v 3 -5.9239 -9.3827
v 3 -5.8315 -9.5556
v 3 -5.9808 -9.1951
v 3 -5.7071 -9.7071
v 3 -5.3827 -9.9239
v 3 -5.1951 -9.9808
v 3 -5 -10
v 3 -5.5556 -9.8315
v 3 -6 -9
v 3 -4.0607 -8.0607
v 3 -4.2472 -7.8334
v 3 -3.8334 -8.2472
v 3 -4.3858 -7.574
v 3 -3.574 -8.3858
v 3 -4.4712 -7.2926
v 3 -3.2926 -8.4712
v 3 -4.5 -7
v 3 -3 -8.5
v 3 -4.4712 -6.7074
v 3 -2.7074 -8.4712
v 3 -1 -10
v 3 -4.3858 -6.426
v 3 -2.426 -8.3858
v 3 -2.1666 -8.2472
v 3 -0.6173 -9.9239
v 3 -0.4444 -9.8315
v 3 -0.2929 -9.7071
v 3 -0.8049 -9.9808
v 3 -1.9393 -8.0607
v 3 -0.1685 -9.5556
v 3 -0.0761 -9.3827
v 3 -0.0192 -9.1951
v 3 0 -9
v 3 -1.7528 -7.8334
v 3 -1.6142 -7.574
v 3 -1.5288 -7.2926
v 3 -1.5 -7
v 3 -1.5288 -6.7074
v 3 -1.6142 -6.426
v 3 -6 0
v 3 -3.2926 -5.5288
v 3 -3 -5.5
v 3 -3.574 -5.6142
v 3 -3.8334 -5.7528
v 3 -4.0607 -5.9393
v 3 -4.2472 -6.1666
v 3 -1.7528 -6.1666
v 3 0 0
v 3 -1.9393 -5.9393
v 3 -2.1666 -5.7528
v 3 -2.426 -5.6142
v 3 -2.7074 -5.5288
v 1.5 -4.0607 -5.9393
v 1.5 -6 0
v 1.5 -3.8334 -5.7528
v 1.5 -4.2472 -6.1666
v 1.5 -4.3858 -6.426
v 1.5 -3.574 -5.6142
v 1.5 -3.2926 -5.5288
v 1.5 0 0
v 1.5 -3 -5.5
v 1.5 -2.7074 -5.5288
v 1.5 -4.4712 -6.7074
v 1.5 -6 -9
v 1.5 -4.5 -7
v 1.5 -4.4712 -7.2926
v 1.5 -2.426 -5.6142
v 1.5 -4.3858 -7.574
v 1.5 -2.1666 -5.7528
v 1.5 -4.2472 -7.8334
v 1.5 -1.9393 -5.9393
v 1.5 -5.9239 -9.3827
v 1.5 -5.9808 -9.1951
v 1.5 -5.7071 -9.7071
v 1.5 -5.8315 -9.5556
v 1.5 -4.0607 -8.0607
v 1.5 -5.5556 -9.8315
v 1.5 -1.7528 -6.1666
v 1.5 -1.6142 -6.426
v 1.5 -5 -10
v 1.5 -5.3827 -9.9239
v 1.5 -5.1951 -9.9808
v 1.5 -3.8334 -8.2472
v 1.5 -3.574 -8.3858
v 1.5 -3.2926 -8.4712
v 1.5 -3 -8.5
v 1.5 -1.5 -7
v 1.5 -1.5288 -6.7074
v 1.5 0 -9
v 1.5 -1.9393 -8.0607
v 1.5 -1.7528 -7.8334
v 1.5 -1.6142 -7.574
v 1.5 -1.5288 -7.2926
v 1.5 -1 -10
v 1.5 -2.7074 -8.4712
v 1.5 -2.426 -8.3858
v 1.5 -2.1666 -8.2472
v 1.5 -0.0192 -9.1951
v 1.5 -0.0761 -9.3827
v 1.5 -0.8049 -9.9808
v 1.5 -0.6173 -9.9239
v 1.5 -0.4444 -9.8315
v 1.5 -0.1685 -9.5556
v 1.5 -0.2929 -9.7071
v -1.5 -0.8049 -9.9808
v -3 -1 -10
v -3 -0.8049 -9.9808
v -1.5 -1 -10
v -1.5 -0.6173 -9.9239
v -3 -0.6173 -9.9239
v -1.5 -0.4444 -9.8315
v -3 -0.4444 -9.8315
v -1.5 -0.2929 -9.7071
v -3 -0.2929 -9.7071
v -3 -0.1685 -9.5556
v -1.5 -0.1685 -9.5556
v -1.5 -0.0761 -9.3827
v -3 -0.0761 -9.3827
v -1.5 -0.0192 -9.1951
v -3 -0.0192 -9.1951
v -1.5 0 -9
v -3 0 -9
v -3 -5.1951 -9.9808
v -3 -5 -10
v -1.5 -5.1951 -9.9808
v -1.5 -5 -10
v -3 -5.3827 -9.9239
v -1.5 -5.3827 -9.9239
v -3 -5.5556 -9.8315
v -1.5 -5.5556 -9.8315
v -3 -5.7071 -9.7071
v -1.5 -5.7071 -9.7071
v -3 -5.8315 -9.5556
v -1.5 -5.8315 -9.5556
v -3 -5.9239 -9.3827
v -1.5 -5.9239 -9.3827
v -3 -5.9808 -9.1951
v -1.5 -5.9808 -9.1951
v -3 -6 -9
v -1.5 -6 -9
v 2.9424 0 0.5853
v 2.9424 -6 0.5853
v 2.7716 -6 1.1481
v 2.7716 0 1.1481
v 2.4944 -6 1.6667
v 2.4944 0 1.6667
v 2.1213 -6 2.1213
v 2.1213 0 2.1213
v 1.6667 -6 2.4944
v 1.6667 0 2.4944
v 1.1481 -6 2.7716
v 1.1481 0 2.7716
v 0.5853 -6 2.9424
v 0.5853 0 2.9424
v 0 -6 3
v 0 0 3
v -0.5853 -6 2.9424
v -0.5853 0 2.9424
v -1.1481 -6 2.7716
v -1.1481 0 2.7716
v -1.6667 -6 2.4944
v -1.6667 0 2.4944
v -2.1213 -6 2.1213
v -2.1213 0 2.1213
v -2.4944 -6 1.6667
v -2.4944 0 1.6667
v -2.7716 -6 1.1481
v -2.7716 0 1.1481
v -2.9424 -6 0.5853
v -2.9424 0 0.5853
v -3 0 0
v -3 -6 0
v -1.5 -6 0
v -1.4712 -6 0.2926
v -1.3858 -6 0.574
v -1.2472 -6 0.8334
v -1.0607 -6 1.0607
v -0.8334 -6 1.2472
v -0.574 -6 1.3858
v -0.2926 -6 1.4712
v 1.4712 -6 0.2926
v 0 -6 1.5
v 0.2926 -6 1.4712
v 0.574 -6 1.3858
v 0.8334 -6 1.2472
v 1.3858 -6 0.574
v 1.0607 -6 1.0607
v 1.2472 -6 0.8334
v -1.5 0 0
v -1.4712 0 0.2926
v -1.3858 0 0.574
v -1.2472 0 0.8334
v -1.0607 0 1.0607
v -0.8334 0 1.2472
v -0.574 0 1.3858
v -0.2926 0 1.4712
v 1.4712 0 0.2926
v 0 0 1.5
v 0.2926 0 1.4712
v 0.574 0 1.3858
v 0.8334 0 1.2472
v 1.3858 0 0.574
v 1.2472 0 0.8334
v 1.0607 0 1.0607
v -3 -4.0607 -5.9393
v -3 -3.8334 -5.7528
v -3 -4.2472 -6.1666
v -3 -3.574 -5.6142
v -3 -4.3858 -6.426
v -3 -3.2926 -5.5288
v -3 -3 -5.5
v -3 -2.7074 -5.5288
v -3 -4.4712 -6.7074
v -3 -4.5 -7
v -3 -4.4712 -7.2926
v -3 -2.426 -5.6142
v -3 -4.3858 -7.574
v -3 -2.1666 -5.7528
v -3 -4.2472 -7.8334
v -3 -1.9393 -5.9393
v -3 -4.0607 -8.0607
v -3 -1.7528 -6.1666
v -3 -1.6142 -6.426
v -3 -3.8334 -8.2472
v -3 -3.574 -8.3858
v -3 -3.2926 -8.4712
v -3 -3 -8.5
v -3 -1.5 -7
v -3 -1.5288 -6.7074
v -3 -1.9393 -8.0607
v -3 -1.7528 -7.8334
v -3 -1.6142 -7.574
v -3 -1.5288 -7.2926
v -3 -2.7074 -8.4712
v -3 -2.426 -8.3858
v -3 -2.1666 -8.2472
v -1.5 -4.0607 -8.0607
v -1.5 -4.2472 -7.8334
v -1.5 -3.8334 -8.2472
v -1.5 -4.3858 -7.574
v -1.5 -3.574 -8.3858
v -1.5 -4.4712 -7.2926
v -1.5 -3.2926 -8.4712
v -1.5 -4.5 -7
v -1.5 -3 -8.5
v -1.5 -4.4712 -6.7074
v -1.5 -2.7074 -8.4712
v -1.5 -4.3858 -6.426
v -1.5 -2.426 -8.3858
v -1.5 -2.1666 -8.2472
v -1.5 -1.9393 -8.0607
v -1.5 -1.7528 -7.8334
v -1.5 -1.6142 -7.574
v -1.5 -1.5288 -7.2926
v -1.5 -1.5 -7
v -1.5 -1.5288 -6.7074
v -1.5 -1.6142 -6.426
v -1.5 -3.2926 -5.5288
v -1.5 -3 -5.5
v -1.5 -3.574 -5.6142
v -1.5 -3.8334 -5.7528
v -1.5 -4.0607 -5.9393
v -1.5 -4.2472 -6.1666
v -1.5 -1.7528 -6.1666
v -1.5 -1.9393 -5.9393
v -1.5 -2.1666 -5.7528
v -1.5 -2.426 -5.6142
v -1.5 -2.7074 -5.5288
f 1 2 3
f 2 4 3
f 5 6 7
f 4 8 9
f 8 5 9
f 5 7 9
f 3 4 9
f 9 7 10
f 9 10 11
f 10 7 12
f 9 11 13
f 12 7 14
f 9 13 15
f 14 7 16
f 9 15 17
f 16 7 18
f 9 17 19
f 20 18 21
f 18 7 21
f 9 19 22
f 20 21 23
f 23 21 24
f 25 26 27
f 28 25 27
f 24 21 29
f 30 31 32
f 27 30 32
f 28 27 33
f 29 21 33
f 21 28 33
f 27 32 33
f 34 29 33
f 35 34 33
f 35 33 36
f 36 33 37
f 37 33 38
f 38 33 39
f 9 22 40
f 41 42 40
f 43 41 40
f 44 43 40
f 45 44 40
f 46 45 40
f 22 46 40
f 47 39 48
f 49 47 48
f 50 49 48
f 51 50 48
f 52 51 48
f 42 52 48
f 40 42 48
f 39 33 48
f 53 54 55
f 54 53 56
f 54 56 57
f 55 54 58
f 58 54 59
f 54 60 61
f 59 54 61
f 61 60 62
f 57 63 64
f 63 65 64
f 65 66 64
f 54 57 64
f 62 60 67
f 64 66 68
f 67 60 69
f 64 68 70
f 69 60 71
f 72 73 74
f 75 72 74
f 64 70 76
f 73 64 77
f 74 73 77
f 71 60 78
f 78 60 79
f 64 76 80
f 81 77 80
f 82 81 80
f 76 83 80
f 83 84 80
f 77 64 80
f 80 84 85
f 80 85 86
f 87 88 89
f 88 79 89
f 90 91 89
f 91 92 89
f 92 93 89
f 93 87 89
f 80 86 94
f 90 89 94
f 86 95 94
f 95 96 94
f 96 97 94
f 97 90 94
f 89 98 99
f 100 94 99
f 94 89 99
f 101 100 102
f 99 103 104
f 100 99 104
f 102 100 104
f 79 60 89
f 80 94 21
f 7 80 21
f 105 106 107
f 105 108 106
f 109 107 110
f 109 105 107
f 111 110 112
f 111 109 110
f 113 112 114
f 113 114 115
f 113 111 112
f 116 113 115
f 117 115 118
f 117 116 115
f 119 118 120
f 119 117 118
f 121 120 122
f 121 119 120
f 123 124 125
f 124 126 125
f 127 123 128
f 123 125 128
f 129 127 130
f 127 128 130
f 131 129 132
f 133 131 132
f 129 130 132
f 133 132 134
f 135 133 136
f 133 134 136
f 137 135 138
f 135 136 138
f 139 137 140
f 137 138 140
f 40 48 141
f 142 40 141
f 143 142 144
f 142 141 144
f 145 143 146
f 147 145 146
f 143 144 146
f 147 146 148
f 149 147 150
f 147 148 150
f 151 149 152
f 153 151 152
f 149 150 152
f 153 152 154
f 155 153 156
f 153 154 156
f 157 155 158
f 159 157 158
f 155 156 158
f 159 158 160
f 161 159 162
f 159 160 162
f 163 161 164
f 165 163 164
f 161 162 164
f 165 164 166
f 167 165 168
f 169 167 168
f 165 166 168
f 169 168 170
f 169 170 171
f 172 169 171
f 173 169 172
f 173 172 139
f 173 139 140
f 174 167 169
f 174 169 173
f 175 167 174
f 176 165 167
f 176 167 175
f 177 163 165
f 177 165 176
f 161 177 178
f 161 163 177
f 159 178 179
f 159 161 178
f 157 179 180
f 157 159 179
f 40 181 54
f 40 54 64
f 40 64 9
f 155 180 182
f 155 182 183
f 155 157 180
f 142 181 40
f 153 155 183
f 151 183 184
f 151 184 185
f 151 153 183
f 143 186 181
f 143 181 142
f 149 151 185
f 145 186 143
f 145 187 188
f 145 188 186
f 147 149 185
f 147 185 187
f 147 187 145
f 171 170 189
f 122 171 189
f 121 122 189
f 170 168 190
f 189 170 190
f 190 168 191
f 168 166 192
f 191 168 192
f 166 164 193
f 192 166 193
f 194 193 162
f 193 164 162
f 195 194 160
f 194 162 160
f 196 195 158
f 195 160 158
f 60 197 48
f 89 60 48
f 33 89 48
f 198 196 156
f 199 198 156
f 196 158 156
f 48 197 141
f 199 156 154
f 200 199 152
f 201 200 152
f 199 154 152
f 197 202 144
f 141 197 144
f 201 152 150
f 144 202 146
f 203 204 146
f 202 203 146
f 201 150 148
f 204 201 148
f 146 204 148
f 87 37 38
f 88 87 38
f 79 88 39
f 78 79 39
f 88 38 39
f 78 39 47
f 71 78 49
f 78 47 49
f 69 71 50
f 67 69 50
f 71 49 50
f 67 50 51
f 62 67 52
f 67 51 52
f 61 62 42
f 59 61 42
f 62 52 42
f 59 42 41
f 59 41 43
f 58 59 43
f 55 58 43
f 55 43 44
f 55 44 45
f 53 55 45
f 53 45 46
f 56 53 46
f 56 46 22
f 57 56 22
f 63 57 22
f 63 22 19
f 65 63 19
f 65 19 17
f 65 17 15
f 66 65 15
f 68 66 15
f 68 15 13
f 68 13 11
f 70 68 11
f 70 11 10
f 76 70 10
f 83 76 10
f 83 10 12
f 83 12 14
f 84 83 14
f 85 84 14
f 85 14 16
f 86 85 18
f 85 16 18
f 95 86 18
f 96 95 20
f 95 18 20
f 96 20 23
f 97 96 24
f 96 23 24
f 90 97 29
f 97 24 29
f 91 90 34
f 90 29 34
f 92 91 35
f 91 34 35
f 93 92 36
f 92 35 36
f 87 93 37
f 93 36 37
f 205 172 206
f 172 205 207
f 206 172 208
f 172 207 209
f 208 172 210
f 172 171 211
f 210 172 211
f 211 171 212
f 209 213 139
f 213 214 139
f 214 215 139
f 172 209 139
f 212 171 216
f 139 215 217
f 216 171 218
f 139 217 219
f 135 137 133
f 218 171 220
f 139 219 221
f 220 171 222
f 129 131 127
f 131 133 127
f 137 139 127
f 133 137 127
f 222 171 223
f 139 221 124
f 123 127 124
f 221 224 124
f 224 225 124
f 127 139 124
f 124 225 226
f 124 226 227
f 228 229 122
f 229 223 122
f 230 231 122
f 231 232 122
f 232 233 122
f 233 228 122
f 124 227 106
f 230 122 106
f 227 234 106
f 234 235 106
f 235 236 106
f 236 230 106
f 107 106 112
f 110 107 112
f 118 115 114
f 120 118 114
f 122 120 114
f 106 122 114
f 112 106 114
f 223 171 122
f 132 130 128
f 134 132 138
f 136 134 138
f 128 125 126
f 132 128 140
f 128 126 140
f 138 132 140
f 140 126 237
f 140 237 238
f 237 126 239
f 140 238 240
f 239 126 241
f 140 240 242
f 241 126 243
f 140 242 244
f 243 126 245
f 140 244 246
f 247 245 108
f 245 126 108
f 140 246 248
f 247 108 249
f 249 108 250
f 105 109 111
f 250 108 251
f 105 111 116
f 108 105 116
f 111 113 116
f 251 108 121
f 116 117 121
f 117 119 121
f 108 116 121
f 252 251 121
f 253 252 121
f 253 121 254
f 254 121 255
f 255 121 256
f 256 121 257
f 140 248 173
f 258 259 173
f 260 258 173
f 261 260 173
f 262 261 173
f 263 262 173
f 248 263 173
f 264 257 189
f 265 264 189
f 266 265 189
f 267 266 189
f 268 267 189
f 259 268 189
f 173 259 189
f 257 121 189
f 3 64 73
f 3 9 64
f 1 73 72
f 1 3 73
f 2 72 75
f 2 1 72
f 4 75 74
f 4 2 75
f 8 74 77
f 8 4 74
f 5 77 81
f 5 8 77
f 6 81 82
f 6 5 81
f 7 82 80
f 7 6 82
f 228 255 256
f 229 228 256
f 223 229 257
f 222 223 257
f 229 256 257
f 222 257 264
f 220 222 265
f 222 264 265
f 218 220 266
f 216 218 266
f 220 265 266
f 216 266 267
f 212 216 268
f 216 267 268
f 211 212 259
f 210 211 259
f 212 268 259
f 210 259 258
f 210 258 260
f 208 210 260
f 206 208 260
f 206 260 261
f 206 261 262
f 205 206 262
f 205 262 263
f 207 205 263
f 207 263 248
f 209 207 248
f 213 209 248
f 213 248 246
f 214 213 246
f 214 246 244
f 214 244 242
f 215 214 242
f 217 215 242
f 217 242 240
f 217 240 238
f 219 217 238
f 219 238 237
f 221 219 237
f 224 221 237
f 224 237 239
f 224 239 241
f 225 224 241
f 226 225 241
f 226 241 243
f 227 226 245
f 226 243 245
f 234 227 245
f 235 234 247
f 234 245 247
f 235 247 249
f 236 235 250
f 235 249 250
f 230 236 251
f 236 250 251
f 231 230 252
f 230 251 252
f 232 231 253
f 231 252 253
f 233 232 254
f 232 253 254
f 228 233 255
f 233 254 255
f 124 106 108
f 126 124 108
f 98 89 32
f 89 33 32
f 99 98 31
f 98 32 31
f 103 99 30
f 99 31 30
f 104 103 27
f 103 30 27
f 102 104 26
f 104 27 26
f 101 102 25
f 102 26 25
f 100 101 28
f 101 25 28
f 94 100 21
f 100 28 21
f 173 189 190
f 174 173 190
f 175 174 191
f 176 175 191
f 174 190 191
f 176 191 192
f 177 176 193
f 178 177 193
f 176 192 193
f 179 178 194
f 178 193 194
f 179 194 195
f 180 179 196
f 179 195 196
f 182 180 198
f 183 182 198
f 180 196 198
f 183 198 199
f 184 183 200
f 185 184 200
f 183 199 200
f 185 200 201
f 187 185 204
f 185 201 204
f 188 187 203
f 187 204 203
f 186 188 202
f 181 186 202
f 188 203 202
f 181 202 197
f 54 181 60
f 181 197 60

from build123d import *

# Parameters (mm, degrees)
F1_DEPTH = 6
F3_D     = 3
F4_R     = 1


# Not quite as in the source:
# - a feature names something its author has since deleted; it is built from what else it names


with BuildPart() as f1:
    # F0 (on Front) → F1 (new body)
    with BuildSketch(Plane.XZ):
        with BuildLine():
            Line((-1.5, -10), (-1.5, 0))
            ThreePointArc((-1.5, 0), (0, 1.5), (1.5, 0))
            Line((1.5, 0), (1.5, -10))
            Line((1.5, -10), (3, -10))
            Line((3, -10), (3, 0))
            ThreePointArc((3, 0), (0, 3), (-3, 0))
            Line((-3, 0), (-3, -10))
            Line((-3, -10), (-1.5, -10))
        make_face()
    extrude(amount=F1_DEPTH)

    # F3 (through all)
    with Locations(Plane(origin=(-3, 0, 0), x_dir=(0, -1, 0), z_dir=(-1, 0, 0))):
        with Locations((3, -7)):
            Hole(F3_D / 2)

    # F4
    f4_edges = [f1.edges().sort_by_distance(p)[0] for p in [
        (-2.25, -6, -10),
        (2.25, -6, -10),
        (2.25, 0, -10),
        (-2.25, 0, -10),
    ]]
    fillet(f4_edges, radius=F4_R)


solid = f1.part
